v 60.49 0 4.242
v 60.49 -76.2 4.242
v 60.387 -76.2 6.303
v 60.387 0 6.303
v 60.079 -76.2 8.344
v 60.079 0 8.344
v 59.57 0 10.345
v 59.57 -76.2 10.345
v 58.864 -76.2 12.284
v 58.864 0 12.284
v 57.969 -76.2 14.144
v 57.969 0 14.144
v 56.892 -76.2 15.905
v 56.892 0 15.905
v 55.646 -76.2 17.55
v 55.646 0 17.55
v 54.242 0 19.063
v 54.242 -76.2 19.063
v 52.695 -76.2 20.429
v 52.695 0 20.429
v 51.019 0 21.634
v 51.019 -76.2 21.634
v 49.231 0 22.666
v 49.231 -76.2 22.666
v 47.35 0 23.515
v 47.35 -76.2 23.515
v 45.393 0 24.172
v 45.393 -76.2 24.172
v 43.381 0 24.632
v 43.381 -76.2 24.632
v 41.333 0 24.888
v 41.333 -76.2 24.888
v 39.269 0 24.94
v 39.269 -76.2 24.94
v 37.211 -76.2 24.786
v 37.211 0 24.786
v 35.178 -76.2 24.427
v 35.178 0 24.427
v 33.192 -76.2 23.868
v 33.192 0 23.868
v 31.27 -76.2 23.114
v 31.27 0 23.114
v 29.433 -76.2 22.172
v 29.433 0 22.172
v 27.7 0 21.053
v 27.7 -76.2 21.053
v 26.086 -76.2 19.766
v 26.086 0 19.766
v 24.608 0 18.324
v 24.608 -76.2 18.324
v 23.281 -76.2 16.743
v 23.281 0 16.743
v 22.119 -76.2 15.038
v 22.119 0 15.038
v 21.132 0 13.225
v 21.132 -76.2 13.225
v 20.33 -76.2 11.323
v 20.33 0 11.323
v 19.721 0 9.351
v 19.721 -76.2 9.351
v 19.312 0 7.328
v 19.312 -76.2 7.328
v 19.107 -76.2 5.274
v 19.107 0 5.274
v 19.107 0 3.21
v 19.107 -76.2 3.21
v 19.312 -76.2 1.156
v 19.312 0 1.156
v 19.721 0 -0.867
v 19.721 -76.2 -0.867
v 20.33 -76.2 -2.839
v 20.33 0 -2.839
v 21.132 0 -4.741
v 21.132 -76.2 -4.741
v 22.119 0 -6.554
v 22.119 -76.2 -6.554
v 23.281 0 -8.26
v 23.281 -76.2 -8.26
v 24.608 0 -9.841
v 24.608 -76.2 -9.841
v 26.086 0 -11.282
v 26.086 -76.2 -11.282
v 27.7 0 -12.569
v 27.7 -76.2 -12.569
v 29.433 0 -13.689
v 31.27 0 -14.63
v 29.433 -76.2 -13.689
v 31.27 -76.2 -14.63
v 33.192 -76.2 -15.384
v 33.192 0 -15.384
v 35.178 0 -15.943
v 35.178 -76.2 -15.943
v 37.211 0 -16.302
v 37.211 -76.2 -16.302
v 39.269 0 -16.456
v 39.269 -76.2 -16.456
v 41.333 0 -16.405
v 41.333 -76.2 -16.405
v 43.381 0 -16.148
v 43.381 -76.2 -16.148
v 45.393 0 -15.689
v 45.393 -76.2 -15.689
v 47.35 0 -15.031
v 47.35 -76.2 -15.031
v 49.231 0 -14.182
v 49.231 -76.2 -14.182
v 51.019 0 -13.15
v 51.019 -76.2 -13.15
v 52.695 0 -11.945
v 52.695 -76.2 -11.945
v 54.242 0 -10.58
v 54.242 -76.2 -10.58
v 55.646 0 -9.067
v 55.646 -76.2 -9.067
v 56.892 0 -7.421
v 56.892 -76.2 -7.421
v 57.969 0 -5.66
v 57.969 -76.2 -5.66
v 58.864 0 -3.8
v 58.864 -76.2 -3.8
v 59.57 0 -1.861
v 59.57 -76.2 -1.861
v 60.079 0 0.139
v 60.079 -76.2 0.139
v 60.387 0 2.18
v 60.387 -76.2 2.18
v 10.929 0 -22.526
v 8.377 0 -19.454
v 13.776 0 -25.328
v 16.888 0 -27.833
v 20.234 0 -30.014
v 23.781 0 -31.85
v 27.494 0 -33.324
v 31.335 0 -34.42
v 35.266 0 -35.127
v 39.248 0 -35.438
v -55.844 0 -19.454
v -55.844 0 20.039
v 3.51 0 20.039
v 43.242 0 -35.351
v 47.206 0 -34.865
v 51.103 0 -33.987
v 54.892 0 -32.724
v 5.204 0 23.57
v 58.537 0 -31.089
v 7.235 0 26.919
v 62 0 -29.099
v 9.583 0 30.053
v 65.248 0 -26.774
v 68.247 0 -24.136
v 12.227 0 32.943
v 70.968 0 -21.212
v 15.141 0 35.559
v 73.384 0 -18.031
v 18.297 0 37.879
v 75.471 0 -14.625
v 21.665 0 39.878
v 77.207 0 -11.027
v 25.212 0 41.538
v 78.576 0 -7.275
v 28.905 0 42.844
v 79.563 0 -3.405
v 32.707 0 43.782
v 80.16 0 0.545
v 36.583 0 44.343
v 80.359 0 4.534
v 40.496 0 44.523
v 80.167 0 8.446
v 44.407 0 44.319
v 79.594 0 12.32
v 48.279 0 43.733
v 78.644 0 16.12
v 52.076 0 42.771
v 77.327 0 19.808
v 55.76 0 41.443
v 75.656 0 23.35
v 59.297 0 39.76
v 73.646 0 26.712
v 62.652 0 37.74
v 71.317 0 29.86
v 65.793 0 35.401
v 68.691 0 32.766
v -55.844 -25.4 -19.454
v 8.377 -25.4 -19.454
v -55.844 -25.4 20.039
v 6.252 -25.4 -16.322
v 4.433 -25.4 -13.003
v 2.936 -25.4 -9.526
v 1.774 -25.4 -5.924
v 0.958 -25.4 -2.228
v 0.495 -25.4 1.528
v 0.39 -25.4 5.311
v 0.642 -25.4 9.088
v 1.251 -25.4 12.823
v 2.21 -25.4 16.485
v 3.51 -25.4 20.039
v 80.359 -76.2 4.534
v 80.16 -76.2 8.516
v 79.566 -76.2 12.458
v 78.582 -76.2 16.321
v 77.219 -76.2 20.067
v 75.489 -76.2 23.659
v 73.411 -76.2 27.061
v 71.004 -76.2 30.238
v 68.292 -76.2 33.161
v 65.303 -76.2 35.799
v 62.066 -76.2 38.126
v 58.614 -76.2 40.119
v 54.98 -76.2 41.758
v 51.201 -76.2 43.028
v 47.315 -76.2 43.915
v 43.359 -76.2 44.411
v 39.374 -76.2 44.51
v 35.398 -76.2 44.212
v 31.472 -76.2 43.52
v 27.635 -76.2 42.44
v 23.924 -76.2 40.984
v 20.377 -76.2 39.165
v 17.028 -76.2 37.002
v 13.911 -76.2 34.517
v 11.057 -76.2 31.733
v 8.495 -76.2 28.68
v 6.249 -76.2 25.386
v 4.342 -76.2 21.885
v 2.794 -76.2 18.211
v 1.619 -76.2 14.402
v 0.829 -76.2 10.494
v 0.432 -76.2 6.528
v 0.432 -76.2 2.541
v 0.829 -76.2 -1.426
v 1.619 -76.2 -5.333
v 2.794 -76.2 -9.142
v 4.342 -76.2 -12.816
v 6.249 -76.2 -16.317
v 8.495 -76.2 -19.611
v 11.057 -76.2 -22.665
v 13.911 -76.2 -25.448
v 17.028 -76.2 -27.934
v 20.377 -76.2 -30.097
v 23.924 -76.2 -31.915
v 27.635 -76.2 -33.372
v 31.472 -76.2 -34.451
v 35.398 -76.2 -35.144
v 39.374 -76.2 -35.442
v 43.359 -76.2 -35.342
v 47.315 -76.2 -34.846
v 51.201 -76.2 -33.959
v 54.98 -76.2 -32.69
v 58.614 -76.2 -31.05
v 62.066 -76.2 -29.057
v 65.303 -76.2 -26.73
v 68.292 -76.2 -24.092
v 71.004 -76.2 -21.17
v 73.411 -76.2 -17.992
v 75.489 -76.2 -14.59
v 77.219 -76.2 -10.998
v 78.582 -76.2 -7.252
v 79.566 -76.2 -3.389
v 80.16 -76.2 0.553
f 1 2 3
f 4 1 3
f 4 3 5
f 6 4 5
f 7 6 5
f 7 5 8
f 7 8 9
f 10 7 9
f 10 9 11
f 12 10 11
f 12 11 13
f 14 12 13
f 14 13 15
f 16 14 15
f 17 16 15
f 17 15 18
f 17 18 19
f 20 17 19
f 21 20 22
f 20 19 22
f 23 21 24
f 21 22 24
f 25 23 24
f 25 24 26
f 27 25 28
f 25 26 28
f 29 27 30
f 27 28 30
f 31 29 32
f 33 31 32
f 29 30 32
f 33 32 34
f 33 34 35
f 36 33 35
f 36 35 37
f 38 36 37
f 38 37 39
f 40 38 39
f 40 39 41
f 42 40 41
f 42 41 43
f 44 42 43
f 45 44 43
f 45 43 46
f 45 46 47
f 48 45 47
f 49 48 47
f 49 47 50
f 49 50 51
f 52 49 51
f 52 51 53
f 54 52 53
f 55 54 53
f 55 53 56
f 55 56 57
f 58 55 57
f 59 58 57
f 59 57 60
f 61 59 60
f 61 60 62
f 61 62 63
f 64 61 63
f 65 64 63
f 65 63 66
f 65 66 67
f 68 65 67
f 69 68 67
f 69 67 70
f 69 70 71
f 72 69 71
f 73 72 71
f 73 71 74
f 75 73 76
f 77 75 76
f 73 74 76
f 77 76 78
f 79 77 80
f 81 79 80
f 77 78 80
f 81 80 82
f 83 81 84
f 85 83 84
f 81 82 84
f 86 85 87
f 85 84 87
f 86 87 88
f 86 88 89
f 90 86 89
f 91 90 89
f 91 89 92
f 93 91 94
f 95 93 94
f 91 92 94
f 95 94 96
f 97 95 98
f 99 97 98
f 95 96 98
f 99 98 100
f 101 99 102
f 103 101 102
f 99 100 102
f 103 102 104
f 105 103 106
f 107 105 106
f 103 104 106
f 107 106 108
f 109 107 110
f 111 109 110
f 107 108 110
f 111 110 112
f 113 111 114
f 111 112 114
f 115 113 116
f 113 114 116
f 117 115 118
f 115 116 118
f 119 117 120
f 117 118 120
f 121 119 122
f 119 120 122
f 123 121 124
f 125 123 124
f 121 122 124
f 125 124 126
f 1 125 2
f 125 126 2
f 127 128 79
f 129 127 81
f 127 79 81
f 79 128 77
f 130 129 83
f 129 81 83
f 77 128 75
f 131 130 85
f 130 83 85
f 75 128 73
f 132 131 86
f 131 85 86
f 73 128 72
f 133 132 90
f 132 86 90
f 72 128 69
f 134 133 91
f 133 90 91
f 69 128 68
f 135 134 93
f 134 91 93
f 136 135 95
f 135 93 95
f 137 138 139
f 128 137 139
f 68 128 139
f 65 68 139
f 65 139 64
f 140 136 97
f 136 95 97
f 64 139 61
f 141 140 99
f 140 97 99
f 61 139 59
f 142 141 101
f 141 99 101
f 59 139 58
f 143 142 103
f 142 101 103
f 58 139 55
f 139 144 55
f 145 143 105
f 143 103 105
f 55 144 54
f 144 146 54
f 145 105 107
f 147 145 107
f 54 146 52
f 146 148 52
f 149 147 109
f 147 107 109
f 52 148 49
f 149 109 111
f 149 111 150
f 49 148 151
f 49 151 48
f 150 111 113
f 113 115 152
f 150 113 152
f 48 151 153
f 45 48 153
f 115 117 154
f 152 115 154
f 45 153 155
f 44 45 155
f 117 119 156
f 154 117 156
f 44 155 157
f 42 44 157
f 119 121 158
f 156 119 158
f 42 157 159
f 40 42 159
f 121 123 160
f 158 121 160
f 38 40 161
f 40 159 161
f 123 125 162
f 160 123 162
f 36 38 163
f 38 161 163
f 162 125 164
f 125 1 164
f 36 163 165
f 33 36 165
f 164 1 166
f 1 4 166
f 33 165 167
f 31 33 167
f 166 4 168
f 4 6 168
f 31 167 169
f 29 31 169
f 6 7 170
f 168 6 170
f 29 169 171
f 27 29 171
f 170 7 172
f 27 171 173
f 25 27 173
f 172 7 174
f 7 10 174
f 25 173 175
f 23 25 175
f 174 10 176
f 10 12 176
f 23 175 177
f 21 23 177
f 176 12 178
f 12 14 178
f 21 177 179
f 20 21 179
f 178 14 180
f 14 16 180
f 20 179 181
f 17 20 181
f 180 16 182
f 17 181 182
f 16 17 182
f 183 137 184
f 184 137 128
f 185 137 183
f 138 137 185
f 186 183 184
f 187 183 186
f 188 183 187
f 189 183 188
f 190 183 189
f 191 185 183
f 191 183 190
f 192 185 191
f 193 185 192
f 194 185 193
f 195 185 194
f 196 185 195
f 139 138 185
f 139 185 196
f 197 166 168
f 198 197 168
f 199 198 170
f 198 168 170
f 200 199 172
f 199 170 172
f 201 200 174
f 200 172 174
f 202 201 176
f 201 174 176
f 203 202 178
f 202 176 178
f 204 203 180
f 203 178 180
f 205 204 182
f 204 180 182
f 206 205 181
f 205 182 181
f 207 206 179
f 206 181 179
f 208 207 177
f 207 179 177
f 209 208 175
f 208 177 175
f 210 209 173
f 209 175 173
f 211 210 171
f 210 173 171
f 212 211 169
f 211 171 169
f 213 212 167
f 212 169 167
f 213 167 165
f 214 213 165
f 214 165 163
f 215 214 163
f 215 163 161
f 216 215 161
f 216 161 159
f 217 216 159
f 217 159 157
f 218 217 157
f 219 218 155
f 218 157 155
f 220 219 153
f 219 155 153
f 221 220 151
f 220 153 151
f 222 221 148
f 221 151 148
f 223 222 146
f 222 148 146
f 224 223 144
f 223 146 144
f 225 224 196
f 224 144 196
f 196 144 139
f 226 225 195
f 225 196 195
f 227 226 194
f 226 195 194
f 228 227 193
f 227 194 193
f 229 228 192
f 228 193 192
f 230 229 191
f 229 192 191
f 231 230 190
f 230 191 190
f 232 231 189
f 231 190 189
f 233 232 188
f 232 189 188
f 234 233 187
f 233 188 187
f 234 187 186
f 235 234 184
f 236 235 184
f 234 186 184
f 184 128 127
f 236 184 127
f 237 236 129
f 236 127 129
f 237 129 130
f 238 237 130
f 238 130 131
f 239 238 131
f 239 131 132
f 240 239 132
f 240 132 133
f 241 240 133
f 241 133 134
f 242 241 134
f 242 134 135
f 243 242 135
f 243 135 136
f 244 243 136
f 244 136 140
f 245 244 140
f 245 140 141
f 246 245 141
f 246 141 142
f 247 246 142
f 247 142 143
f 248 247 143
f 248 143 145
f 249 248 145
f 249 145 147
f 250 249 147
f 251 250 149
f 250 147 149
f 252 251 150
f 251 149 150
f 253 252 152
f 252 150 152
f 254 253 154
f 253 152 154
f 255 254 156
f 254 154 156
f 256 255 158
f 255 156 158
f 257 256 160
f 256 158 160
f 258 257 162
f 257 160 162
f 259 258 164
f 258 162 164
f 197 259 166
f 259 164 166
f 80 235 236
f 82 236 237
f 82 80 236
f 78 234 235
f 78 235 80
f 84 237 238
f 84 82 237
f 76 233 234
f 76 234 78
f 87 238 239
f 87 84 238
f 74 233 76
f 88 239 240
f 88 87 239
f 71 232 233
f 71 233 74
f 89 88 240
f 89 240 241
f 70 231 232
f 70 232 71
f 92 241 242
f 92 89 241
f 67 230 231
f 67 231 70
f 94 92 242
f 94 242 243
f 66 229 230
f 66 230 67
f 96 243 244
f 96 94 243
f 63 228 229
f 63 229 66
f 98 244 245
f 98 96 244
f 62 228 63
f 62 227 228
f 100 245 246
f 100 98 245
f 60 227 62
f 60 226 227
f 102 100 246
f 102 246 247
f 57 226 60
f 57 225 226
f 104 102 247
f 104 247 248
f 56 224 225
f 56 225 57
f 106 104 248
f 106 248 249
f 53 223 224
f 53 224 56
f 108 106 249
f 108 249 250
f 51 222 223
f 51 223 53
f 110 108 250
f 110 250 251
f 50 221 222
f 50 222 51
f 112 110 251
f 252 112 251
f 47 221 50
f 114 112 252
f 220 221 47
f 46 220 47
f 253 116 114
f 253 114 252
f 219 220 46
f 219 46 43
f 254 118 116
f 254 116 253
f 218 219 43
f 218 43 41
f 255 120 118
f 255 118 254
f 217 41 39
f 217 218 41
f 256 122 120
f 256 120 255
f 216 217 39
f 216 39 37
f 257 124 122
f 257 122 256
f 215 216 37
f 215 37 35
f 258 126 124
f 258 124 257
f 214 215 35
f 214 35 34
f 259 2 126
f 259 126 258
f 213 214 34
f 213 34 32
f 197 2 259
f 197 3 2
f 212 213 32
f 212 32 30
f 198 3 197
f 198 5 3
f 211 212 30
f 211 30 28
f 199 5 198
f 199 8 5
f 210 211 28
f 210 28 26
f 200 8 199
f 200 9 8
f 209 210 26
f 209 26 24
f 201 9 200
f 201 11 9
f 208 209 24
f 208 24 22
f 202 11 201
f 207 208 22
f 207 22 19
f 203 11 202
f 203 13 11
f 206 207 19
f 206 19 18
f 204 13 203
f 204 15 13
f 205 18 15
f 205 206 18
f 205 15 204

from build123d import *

# Parameters (mm, degrees)
F0_R      = 39.988353
F1_DEPTH  = 25.4
F1_FACE_R = 39.988353
F2_DEPTH  = 50.8
F3_R      = 20.704391
F4_DEPTH  = 76.201
F5_W      = 66.406839
F5_H      = 39.493055
F6_DEPTH  = 25.4


with BuildPart() as f1:
    # F0 (on Front) → F1 (new body)
    with BuildSketch(Plane.XZ):
        with Locations((40.370677, 4.534387)):
            Circle(F0_R)
    extrude(amount=F1_DEPTH)

    # F1_face (on face) → F2 (join)
    with BuildSketch(Plane(origin=(40.370677, -25.4, 4.534387), x_dir=(1, 0, 0), z_dir=(0, -1, 0))):
        Circle(F1_FACE_R)
    extrude(amount=F2_DEPTH)

    # F3 (on face) → F4 (cut, through all)
    with BuildSketch(Plane.XZ.offset(76.2)):
        with Locations((39.785597, 4.241847)):
            Circle(F3_R)
    extrude(amount=-F4_DEPTH, mode=Mode.SUBTRACT)

    # F5 (on Front) → F6 (join)
    with BuildSketch(Plane.XZ):
        with Locations((-22.640213, 0.292541)):
            Rectangle(F5_W, F5_H)
    extrude(amount=F6_DEPTH)


solid = f1.part
